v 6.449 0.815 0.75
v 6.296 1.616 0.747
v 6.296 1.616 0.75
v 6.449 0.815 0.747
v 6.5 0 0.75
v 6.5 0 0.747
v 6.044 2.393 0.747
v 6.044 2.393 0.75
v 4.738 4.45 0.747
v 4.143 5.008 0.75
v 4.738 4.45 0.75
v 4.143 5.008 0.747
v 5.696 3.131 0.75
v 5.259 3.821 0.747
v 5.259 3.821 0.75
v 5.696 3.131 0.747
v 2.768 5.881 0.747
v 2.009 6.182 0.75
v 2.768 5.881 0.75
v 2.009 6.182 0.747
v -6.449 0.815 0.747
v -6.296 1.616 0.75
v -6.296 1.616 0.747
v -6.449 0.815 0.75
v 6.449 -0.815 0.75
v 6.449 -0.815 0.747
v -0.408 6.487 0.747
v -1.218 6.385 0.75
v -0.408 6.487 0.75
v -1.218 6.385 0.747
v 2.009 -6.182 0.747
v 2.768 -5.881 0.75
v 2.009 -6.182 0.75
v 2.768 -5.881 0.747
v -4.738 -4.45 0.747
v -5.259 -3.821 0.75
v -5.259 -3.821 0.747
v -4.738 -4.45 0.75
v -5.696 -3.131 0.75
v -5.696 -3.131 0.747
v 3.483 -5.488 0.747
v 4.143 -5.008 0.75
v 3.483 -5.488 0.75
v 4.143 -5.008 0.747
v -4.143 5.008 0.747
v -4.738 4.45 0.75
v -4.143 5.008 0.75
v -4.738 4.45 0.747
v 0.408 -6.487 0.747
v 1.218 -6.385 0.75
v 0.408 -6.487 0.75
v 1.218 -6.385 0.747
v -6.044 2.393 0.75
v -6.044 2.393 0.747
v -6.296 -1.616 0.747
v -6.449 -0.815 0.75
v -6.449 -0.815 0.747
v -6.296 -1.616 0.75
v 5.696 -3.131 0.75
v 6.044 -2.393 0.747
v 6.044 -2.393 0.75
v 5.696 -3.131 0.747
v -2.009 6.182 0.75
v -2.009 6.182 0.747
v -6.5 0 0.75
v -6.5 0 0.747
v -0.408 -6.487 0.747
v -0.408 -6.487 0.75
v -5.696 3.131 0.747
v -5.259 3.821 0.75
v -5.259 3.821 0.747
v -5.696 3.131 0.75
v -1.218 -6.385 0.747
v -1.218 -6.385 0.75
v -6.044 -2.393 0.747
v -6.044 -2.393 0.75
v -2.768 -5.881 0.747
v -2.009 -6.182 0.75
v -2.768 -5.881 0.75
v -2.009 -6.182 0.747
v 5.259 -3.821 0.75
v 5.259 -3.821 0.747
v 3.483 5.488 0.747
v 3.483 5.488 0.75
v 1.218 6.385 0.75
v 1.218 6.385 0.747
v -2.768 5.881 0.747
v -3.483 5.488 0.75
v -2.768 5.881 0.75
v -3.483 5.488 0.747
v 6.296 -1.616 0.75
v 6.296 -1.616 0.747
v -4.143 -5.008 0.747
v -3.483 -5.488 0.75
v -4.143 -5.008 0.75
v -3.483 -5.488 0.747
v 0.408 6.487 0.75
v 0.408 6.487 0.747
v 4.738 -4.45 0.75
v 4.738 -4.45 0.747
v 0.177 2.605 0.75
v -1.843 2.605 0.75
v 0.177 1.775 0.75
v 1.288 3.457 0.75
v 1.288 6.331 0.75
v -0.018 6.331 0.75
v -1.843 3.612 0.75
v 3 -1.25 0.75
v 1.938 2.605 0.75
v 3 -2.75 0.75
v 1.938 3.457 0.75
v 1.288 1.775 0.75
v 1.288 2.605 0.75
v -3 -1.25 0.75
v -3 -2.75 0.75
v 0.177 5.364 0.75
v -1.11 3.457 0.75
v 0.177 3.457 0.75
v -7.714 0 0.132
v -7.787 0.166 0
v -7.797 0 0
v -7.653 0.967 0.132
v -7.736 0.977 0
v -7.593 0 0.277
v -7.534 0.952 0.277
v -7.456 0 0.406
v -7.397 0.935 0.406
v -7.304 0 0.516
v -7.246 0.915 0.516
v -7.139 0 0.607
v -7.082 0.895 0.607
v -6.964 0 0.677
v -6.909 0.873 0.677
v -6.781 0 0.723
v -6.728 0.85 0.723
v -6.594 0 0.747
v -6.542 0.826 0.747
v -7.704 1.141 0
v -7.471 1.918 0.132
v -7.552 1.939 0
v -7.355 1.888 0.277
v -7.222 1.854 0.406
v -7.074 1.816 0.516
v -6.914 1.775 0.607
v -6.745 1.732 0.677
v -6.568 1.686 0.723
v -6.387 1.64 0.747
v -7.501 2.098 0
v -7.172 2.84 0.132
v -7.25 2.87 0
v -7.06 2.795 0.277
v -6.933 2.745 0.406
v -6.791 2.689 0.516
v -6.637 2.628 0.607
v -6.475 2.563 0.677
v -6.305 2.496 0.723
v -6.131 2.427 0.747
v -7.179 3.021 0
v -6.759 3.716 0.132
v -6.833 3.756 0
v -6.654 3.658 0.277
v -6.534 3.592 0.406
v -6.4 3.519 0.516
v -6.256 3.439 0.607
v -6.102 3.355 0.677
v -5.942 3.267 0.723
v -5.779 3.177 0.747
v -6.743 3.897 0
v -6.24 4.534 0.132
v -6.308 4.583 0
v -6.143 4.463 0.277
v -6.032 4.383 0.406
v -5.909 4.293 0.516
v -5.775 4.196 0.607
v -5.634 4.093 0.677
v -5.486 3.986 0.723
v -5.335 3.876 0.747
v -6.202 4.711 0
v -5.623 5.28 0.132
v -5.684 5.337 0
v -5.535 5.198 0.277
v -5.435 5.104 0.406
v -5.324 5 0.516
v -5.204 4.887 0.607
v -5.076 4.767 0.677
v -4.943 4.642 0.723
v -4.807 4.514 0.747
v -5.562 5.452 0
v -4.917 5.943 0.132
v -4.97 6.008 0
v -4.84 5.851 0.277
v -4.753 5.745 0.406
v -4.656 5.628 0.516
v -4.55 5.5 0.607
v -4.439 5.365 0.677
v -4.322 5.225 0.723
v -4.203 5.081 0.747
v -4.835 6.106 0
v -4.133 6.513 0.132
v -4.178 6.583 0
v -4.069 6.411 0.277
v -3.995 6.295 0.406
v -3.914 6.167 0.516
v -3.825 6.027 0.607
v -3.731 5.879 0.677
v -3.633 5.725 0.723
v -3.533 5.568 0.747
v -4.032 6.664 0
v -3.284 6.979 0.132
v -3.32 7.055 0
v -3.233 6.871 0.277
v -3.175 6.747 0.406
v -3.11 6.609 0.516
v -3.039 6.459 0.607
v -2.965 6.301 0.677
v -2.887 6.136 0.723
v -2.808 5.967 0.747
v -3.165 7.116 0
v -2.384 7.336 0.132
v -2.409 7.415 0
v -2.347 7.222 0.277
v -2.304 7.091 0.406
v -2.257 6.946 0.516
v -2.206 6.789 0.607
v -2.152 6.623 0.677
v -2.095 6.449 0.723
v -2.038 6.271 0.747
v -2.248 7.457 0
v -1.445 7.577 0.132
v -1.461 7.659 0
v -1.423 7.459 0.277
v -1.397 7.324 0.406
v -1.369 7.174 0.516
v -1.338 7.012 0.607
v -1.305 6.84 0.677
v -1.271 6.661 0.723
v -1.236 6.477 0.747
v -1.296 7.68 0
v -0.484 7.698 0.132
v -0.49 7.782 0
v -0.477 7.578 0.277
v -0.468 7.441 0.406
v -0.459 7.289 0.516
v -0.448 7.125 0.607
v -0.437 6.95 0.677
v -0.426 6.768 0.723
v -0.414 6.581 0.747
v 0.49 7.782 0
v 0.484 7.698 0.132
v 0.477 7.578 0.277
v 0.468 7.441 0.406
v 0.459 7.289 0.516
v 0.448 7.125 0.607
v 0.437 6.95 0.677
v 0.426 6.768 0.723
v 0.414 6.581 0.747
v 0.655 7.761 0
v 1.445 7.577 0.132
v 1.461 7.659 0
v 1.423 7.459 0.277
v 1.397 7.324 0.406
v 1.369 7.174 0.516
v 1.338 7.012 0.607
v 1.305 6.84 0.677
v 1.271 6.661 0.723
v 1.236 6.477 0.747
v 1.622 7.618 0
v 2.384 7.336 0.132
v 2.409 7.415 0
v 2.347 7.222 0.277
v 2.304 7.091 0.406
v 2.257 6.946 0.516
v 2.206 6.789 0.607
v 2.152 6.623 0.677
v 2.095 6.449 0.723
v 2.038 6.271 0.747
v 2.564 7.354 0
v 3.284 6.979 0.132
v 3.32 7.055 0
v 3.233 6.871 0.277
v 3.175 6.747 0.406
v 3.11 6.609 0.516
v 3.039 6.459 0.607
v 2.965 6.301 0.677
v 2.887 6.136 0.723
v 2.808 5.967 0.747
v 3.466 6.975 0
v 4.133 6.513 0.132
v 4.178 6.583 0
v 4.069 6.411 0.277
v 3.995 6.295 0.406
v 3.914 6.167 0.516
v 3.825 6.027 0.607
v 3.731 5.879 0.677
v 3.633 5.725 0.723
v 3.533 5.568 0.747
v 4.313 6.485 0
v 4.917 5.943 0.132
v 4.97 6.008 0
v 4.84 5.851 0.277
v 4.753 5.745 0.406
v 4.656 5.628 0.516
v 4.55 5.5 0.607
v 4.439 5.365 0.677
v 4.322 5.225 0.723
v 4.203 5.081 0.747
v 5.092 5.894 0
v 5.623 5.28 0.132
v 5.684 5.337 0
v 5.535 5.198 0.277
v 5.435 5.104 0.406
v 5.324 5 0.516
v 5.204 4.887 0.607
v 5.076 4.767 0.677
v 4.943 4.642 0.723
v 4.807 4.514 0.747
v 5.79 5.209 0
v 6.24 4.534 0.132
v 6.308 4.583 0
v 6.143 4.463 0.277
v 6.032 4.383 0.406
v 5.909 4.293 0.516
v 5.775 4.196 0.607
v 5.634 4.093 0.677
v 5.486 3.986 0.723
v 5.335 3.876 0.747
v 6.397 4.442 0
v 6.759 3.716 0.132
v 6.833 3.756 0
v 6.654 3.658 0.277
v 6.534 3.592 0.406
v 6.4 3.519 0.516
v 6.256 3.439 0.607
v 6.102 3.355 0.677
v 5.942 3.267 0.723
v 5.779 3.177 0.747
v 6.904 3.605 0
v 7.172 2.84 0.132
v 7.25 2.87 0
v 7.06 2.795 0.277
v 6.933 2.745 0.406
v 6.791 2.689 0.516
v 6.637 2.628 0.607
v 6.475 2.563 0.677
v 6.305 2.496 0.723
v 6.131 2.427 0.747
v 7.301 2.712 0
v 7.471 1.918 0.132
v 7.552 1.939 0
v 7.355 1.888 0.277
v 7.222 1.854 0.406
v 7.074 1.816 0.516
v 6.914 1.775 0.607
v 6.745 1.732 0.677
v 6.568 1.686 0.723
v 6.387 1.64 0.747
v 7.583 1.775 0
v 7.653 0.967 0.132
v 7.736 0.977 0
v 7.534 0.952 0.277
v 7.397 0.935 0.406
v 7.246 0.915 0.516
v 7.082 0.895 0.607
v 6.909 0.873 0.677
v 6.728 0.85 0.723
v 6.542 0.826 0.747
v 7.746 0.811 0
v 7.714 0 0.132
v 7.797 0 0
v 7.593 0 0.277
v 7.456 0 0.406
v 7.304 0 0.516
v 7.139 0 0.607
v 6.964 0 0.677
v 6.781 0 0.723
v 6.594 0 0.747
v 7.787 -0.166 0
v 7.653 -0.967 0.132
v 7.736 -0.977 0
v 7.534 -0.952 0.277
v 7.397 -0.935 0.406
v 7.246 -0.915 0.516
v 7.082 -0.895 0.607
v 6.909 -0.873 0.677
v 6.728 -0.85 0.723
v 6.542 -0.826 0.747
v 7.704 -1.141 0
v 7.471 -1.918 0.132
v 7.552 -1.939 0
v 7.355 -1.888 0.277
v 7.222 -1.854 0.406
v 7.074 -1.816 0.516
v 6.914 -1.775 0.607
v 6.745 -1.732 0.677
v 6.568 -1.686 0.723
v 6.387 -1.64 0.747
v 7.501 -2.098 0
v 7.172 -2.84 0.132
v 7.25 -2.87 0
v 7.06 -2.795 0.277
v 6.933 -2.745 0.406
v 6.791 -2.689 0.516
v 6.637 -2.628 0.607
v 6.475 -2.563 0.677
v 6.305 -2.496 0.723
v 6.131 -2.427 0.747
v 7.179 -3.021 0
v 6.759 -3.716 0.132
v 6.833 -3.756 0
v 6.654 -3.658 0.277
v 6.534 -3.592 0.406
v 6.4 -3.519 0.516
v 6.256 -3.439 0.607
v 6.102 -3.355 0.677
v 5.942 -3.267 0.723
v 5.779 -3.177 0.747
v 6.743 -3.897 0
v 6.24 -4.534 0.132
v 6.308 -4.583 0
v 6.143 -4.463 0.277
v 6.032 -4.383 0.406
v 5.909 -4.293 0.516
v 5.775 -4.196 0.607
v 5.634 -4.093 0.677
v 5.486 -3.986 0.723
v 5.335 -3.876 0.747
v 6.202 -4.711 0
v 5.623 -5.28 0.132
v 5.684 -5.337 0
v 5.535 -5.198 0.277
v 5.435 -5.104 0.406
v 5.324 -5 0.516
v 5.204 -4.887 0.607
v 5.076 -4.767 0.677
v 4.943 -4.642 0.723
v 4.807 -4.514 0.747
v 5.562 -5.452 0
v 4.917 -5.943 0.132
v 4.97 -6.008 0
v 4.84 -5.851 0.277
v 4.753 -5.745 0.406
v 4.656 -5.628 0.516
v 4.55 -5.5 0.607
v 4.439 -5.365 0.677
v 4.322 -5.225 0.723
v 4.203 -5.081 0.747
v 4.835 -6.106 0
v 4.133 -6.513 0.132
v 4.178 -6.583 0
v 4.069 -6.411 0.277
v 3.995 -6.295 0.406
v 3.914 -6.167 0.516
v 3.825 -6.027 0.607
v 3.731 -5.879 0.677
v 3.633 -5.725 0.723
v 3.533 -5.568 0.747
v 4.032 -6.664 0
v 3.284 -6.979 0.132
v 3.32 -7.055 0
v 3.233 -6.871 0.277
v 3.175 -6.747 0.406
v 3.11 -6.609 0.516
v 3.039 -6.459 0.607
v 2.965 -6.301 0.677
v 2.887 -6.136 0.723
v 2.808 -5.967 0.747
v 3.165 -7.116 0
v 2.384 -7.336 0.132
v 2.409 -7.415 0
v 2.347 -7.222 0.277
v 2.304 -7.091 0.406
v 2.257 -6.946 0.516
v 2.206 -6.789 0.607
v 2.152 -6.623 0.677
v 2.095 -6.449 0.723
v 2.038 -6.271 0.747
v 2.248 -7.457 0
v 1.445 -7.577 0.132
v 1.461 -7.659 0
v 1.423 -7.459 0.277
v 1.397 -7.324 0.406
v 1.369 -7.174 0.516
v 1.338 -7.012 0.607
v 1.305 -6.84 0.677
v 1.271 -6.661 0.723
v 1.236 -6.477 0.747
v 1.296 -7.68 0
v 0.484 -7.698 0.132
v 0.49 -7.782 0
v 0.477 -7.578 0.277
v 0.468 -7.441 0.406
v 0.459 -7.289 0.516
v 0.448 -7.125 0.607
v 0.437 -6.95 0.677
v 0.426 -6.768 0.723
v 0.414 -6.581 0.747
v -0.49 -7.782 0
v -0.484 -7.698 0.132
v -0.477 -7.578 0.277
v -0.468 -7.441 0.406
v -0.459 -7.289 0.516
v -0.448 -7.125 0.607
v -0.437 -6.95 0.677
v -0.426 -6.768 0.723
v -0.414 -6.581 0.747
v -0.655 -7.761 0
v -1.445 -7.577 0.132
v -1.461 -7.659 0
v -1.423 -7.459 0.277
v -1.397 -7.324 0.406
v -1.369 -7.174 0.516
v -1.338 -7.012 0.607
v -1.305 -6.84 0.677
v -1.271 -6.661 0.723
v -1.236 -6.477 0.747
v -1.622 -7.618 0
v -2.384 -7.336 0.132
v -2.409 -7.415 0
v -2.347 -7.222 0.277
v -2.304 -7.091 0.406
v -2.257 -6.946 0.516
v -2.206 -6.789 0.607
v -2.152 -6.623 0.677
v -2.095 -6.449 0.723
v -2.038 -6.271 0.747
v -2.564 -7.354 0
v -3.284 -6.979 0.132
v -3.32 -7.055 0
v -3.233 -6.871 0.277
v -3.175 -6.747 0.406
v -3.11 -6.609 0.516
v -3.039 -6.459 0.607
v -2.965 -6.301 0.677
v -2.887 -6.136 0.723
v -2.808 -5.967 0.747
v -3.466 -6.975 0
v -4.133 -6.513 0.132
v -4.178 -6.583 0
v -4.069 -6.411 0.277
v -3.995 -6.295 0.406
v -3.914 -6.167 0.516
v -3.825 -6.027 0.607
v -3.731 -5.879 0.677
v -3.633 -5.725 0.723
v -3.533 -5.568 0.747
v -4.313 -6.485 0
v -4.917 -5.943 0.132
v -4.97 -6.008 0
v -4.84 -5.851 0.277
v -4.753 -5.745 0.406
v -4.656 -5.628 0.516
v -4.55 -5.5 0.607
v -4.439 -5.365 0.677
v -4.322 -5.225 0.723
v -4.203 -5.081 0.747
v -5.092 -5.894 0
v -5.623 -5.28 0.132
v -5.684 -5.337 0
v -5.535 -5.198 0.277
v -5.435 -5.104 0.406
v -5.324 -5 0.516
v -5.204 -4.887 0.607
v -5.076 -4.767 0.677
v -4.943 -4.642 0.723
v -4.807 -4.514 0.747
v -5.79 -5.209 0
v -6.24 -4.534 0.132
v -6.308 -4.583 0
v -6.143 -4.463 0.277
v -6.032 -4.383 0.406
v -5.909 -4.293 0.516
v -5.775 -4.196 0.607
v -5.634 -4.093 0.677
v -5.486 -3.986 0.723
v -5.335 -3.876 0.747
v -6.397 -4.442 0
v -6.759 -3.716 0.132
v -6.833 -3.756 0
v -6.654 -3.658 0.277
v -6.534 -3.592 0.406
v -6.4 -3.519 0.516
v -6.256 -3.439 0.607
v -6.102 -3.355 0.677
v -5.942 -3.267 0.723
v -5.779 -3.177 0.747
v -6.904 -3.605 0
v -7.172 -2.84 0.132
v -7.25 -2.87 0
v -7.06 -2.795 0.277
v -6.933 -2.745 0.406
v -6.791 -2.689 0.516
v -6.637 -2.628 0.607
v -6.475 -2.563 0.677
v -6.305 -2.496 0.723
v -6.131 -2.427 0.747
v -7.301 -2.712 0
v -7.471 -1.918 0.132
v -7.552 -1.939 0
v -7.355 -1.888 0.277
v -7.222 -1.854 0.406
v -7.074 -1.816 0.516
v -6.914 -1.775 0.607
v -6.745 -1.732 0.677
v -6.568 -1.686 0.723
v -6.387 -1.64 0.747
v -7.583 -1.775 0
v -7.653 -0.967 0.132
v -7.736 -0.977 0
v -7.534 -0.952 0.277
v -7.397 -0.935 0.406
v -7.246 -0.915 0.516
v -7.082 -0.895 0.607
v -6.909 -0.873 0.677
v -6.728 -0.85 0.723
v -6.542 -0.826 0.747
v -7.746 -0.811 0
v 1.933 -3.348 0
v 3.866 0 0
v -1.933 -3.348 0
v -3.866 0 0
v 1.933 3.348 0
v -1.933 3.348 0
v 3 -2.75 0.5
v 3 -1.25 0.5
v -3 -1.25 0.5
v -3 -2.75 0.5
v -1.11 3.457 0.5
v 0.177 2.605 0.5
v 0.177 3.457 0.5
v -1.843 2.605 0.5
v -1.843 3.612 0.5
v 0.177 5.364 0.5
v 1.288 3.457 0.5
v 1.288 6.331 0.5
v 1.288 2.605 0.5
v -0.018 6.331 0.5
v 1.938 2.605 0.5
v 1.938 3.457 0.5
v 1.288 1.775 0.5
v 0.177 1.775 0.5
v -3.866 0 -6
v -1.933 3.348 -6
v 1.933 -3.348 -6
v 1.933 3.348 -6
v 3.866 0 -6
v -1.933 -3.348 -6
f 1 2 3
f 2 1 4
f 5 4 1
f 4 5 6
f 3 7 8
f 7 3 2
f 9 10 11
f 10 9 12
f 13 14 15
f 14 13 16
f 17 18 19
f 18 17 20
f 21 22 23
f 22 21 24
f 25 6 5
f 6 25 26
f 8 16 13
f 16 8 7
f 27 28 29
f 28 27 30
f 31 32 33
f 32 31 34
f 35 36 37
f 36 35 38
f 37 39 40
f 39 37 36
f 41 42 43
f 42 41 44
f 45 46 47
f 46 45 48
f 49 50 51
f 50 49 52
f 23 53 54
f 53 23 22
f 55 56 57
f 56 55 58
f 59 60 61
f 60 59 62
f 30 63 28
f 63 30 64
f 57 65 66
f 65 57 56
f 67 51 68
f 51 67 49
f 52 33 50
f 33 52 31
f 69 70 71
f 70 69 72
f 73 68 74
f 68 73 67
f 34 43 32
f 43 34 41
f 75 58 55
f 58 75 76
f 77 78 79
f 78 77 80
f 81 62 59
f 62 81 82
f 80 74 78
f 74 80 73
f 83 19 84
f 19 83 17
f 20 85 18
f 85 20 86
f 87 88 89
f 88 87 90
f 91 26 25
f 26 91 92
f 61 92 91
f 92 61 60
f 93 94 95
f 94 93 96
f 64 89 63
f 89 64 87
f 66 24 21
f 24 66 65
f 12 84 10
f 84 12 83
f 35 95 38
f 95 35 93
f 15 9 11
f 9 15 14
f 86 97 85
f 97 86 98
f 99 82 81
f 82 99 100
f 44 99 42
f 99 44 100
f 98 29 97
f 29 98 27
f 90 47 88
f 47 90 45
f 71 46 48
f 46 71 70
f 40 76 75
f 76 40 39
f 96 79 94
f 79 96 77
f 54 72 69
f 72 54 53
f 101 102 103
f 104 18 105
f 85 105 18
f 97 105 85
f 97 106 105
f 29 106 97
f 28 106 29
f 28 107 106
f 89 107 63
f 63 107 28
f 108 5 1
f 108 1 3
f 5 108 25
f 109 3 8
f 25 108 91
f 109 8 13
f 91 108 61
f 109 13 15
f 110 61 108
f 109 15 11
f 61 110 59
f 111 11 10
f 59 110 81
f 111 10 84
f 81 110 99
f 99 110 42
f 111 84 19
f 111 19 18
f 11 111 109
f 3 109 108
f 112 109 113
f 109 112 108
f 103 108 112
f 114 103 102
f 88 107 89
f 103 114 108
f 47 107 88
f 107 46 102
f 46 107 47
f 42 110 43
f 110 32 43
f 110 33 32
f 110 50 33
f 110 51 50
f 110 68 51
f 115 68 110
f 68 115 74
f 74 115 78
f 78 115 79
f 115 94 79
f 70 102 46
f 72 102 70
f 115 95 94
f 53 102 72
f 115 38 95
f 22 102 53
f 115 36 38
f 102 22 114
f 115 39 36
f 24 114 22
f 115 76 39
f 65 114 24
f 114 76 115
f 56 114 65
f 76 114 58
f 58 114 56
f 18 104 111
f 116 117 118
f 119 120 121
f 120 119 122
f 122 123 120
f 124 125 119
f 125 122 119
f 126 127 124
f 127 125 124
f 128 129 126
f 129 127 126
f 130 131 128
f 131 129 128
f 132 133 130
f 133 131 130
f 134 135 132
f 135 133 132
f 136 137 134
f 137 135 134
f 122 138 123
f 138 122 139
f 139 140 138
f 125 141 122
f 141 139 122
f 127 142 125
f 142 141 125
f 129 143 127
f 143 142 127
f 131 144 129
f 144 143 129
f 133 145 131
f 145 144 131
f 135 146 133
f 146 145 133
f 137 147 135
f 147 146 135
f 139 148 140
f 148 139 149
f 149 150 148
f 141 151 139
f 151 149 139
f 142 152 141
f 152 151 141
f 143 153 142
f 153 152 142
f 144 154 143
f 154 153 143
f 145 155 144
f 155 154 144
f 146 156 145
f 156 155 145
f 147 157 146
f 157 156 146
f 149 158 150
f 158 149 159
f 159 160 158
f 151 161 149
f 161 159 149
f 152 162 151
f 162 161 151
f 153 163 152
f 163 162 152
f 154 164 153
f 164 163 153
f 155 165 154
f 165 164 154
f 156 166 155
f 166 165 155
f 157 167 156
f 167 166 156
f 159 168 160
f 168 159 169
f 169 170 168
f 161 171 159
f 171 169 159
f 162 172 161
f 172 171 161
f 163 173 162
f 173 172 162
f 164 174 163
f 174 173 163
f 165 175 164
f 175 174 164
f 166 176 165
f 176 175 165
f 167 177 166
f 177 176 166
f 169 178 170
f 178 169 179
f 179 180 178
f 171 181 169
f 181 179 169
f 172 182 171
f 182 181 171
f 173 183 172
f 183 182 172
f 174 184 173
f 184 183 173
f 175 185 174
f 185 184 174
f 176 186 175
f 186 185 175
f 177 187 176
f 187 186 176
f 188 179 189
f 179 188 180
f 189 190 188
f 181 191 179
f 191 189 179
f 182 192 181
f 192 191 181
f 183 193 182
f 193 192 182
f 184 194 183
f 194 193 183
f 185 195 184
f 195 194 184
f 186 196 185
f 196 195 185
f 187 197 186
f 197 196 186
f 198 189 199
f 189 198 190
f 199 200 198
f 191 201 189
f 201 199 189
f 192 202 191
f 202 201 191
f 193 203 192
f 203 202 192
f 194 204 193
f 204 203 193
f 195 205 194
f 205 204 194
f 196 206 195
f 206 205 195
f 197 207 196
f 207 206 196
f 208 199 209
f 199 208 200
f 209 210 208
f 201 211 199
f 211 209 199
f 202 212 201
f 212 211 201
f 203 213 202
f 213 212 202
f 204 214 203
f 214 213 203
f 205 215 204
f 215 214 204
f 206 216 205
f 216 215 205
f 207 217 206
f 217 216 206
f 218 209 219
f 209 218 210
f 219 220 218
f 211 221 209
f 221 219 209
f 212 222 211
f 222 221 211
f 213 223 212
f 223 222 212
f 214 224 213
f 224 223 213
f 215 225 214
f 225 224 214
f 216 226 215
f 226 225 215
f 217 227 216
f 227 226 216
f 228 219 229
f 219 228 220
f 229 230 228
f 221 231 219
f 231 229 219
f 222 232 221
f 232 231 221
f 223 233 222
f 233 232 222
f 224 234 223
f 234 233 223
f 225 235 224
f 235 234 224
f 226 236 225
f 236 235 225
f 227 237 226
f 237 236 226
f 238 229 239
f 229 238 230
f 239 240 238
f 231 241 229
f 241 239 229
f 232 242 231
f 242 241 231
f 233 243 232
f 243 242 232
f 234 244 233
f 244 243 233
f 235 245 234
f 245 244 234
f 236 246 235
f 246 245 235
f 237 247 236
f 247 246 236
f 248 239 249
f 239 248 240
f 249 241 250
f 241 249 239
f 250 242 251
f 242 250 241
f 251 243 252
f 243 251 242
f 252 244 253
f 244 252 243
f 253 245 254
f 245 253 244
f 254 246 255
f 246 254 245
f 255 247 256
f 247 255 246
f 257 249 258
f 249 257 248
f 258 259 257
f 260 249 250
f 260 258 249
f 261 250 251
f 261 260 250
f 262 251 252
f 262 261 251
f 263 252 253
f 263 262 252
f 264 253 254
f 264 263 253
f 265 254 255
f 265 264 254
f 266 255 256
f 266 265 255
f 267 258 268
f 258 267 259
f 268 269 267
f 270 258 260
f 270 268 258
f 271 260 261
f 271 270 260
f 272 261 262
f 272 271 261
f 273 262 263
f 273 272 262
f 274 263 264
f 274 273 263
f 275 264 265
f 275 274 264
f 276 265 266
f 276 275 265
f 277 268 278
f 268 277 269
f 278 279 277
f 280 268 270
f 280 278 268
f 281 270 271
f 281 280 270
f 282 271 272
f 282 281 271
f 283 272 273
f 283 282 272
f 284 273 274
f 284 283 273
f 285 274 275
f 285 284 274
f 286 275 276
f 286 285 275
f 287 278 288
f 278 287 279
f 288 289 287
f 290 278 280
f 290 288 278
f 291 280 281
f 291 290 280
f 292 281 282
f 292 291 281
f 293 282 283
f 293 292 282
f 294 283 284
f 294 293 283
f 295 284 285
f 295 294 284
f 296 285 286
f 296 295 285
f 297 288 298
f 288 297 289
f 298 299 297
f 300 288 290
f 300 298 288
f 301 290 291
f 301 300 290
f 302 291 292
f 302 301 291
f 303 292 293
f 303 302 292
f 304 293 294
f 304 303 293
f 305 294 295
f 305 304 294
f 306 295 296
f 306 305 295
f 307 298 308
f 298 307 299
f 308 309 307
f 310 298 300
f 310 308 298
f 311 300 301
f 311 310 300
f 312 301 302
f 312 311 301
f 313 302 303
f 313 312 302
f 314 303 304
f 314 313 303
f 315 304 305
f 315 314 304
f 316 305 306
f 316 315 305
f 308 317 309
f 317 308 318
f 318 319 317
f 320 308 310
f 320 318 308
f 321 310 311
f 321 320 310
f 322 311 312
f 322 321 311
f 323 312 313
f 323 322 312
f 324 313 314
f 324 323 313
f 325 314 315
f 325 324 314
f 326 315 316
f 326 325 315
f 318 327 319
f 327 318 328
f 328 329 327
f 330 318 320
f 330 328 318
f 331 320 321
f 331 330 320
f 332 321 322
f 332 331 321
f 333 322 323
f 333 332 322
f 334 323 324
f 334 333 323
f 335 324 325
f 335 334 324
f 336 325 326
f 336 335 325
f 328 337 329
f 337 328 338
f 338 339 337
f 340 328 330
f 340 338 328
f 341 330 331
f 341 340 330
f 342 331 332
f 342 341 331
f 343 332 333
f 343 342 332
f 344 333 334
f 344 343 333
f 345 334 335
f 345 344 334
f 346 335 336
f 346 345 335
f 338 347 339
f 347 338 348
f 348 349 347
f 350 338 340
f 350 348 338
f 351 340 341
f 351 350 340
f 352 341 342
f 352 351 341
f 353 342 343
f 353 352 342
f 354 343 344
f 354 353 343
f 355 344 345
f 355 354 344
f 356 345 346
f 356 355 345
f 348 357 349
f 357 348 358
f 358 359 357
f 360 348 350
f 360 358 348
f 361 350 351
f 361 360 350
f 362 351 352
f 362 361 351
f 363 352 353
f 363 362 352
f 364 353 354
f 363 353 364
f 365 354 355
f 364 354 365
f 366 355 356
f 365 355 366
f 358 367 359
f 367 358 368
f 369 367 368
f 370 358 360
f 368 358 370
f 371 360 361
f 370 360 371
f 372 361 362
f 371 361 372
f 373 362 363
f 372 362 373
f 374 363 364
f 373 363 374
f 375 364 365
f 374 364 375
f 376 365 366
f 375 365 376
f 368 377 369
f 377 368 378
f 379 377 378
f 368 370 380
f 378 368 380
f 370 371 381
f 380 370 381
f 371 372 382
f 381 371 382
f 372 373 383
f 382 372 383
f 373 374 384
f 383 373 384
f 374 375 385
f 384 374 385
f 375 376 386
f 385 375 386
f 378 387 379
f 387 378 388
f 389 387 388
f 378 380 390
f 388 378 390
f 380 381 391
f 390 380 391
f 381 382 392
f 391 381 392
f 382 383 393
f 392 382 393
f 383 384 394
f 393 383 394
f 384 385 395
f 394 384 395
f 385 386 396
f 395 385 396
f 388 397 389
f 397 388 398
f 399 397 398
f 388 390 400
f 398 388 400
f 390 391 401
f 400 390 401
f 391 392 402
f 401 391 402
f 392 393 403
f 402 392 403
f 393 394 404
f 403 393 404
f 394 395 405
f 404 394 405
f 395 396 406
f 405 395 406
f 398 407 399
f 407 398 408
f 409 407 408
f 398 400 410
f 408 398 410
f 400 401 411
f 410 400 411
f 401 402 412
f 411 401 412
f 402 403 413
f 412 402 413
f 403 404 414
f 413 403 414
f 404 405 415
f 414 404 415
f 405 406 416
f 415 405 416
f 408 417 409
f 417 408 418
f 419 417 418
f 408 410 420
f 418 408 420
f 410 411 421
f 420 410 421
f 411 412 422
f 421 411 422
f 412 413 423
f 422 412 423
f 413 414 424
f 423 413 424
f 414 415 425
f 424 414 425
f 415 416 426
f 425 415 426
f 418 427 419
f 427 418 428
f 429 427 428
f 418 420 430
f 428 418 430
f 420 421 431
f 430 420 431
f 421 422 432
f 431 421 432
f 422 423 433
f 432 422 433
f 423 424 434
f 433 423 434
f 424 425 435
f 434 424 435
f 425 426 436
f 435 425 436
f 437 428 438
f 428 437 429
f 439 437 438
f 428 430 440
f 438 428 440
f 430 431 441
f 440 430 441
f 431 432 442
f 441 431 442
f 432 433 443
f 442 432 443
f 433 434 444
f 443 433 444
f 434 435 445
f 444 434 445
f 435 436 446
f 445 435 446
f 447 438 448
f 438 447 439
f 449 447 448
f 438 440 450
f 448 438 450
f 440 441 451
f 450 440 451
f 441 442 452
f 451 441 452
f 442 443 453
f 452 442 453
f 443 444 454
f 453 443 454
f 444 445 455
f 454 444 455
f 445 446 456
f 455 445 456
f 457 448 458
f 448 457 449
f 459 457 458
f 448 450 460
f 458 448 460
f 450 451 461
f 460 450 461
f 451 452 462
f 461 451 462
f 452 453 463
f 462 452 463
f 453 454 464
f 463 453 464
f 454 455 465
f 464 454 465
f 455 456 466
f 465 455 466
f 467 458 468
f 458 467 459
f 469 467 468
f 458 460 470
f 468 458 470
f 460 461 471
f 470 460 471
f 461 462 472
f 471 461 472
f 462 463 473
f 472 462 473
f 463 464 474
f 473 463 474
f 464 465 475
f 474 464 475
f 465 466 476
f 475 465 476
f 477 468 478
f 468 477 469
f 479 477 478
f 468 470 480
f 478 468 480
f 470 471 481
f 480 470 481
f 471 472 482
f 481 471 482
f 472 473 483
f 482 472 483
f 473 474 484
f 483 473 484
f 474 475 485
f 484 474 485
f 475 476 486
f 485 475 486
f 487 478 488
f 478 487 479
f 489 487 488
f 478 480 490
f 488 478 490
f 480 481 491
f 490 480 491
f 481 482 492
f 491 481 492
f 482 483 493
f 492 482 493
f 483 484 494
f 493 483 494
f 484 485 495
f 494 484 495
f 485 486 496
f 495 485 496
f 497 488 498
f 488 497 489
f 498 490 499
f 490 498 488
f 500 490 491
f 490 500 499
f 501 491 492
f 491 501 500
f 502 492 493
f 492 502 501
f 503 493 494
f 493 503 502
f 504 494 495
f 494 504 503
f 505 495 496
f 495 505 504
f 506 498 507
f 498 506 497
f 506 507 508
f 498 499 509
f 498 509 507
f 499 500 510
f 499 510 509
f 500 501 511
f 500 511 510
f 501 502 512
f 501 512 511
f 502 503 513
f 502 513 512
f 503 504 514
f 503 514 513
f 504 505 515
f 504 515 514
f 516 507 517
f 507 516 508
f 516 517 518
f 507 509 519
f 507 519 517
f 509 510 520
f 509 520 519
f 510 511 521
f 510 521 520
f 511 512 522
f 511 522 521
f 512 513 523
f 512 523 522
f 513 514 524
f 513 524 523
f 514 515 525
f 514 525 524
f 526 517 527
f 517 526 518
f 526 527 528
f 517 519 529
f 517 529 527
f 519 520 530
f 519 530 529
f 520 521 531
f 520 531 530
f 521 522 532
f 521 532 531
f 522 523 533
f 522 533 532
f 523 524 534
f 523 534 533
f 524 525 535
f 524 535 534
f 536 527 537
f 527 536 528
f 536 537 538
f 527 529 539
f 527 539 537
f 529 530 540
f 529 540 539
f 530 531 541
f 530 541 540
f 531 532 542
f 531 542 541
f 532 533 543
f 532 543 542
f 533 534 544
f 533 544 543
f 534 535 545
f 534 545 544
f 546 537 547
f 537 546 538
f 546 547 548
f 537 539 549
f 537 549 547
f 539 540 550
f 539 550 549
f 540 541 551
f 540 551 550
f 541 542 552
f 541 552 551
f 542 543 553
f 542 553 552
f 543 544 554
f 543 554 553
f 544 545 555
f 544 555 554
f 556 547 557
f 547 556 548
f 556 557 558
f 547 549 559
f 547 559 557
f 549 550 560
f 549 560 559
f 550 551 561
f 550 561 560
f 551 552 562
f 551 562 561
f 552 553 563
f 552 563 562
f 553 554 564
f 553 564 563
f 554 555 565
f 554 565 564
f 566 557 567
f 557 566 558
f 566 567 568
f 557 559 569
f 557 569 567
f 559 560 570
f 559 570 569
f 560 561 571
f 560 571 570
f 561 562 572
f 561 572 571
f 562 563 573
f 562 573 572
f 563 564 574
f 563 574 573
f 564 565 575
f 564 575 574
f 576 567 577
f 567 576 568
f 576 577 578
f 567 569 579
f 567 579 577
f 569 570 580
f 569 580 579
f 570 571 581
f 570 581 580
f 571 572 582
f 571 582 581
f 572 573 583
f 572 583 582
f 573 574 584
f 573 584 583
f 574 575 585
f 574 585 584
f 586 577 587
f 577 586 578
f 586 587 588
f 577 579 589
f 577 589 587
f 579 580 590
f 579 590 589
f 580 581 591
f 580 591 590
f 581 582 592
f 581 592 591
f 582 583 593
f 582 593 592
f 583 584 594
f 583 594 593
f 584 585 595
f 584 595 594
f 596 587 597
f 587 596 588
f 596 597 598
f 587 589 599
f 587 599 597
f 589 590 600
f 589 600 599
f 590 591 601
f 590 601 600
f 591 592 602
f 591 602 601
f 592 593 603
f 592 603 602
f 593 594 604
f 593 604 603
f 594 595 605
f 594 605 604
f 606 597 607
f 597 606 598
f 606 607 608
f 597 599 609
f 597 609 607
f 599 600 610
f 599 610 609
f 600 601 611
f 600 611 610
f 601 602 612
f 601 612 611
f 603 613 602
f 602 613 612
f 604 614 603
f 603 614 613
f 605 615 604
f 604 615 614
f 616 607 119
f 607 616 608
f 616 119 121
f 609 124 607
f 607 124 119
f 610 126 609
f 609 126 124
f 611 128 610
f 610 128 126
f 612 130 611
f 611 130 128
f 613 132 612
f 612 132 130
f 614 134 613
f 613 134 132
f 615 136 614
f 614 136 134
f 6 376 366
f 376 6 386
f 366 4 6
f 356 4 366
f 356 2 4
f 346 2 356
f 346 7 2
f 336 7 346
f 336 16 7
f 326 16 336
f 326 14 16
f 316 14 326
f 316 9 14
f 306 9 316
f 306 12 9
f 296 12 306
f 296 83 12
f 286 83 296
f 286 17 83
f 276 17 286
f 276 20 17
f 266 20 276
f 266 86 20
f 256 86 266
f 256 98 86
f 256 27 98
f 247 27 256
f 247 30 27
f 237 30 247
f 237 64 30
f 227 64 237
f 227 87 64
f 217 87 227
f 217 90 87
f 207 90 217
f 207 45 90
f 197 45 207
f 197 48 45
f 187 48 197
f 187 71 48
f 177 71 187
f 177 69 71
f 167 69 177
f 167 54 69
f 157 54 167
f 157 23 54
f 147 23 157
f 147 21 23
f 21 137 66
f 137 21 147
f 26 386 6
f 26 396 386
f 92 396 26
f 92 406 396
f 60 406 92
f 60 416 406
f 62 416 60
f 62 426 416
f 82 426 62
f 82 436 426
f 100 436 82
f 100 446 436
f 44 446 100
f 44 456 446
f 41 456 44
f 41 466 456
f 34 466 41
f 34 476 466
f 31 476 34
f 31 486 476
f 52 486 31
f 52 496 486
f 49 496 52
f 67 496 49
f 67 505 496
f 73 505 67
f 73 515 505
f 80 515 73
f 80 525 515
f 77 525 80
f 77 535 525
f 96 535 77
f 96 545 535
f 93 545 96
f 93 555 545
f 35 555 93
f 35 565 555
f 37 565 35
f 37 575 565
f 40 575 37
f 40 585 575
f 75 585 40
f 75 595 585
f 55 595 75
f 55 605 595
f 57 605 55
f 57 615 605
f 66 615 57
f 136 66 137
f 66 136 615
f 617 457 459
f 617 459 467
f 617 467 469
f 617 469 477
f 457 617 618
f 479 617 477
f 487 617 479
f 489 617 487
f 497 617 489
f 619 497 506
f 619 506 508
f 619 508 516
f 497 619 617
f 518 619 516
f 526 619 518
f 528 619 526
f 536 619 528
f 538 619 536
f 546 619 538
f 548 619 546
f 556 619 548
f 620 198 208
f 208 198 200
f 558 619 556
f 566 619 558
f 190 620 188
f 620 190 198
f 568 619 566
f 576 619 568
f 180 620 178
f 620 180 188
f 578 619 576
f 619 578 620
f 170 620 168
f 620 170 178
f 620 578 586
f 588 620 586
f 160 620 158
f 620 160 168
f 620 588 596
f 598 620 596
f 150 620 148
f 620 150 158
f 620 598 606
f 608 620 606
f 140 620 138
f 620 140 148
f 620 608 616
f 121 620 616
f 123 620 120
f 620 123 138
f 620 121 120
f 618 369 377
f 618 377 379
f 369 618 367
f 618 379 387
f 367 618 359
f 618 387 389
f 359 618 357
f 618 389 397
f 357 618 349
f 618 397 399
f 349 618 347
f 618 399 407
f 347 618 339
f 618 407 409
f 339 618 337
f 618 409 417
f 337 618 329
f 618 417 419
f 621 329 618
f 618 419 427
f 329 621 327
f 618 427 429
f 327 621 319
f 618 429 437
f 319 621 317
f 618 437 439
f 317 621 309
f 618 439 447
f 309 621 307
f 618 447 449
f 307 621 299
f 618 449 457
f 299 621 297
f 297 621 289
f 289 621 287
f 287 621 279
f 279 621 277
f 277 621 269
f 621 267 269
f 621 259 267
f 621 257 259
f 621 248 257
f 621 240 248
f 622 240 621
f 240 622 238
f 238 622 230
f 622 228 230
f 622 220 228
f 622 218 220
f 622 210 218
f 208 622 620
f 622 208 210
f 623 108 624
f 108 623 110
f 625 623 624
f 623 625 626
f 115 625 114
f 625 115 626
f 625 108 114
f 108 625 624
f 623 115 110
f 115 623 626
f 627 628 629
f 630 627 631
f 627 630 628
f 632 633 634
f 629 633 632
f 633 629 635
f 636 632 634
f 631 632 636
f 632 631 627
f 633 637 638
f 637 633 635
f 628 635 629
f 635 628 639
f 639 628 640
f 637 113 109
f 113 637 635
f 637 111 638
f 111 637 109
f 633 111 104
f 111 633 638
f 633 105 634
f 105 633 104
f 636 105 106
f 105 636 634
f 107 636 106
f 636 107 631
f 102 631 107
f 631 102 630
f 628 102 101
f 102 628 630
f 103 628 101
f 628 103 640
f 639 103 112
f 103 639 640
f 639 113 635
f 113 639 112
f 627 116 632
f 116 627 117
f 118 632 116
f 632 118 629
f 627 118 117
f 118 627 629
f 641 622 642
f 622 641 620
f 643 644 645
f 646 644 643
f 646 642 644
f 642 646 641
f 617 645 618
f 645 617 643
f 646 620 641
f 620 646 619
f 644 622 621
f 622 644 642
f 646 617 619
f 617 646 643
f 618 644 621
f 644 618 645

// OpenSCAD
$fn = 50;


union() {
	difference() {
		union() {
			translate(v = [0, 0, -0.7500000000]) {
				cylinder(h = 1.5000000000, r = 6.5000000000);
			}
			translate(v = [0, 0, -0.7500000000]) {
				rotate_extrude(angle = 360) {
					translate(v = [6.5000000000, 0, 0]) {
						circle(r = 1.5000000000);
					}
				}
			}
		}
		union() {
			translate(v = [-25.0000000000, -25.0000000000, -50]) {
				cube(size = [50, 50, 50]);
			}
			#translate(v = [-3.0000000000, -2.7500000000, 0.5000000000]) {
				cube(size = [6, 1.5000000000, 0.2500000000]);
			}
			#translate(v = [0, 4, 0.5000000000]) {
				linear_extrude(height = 0.2500000000) {
					text(font = "SegoiUI:Bold", halign = "center", size = 4.5000000000, text = "4", valign = "center");
				}
			}
		}
	}
	union() {
		translate(v = [0, 0, -6]) {
			linear_extrude(height = 6) {
				polygon(points = [[3.8658550000, 0.0000000000], [1.9329275000, 3.3479286373], [-1.9329275000, 3.3479286373], [-3.8658550000, 0.0000000000], [-1.9329275000, -3.3479286373], [1.9329275000, -3.3479286373]]);
			}
		}
	}
}
